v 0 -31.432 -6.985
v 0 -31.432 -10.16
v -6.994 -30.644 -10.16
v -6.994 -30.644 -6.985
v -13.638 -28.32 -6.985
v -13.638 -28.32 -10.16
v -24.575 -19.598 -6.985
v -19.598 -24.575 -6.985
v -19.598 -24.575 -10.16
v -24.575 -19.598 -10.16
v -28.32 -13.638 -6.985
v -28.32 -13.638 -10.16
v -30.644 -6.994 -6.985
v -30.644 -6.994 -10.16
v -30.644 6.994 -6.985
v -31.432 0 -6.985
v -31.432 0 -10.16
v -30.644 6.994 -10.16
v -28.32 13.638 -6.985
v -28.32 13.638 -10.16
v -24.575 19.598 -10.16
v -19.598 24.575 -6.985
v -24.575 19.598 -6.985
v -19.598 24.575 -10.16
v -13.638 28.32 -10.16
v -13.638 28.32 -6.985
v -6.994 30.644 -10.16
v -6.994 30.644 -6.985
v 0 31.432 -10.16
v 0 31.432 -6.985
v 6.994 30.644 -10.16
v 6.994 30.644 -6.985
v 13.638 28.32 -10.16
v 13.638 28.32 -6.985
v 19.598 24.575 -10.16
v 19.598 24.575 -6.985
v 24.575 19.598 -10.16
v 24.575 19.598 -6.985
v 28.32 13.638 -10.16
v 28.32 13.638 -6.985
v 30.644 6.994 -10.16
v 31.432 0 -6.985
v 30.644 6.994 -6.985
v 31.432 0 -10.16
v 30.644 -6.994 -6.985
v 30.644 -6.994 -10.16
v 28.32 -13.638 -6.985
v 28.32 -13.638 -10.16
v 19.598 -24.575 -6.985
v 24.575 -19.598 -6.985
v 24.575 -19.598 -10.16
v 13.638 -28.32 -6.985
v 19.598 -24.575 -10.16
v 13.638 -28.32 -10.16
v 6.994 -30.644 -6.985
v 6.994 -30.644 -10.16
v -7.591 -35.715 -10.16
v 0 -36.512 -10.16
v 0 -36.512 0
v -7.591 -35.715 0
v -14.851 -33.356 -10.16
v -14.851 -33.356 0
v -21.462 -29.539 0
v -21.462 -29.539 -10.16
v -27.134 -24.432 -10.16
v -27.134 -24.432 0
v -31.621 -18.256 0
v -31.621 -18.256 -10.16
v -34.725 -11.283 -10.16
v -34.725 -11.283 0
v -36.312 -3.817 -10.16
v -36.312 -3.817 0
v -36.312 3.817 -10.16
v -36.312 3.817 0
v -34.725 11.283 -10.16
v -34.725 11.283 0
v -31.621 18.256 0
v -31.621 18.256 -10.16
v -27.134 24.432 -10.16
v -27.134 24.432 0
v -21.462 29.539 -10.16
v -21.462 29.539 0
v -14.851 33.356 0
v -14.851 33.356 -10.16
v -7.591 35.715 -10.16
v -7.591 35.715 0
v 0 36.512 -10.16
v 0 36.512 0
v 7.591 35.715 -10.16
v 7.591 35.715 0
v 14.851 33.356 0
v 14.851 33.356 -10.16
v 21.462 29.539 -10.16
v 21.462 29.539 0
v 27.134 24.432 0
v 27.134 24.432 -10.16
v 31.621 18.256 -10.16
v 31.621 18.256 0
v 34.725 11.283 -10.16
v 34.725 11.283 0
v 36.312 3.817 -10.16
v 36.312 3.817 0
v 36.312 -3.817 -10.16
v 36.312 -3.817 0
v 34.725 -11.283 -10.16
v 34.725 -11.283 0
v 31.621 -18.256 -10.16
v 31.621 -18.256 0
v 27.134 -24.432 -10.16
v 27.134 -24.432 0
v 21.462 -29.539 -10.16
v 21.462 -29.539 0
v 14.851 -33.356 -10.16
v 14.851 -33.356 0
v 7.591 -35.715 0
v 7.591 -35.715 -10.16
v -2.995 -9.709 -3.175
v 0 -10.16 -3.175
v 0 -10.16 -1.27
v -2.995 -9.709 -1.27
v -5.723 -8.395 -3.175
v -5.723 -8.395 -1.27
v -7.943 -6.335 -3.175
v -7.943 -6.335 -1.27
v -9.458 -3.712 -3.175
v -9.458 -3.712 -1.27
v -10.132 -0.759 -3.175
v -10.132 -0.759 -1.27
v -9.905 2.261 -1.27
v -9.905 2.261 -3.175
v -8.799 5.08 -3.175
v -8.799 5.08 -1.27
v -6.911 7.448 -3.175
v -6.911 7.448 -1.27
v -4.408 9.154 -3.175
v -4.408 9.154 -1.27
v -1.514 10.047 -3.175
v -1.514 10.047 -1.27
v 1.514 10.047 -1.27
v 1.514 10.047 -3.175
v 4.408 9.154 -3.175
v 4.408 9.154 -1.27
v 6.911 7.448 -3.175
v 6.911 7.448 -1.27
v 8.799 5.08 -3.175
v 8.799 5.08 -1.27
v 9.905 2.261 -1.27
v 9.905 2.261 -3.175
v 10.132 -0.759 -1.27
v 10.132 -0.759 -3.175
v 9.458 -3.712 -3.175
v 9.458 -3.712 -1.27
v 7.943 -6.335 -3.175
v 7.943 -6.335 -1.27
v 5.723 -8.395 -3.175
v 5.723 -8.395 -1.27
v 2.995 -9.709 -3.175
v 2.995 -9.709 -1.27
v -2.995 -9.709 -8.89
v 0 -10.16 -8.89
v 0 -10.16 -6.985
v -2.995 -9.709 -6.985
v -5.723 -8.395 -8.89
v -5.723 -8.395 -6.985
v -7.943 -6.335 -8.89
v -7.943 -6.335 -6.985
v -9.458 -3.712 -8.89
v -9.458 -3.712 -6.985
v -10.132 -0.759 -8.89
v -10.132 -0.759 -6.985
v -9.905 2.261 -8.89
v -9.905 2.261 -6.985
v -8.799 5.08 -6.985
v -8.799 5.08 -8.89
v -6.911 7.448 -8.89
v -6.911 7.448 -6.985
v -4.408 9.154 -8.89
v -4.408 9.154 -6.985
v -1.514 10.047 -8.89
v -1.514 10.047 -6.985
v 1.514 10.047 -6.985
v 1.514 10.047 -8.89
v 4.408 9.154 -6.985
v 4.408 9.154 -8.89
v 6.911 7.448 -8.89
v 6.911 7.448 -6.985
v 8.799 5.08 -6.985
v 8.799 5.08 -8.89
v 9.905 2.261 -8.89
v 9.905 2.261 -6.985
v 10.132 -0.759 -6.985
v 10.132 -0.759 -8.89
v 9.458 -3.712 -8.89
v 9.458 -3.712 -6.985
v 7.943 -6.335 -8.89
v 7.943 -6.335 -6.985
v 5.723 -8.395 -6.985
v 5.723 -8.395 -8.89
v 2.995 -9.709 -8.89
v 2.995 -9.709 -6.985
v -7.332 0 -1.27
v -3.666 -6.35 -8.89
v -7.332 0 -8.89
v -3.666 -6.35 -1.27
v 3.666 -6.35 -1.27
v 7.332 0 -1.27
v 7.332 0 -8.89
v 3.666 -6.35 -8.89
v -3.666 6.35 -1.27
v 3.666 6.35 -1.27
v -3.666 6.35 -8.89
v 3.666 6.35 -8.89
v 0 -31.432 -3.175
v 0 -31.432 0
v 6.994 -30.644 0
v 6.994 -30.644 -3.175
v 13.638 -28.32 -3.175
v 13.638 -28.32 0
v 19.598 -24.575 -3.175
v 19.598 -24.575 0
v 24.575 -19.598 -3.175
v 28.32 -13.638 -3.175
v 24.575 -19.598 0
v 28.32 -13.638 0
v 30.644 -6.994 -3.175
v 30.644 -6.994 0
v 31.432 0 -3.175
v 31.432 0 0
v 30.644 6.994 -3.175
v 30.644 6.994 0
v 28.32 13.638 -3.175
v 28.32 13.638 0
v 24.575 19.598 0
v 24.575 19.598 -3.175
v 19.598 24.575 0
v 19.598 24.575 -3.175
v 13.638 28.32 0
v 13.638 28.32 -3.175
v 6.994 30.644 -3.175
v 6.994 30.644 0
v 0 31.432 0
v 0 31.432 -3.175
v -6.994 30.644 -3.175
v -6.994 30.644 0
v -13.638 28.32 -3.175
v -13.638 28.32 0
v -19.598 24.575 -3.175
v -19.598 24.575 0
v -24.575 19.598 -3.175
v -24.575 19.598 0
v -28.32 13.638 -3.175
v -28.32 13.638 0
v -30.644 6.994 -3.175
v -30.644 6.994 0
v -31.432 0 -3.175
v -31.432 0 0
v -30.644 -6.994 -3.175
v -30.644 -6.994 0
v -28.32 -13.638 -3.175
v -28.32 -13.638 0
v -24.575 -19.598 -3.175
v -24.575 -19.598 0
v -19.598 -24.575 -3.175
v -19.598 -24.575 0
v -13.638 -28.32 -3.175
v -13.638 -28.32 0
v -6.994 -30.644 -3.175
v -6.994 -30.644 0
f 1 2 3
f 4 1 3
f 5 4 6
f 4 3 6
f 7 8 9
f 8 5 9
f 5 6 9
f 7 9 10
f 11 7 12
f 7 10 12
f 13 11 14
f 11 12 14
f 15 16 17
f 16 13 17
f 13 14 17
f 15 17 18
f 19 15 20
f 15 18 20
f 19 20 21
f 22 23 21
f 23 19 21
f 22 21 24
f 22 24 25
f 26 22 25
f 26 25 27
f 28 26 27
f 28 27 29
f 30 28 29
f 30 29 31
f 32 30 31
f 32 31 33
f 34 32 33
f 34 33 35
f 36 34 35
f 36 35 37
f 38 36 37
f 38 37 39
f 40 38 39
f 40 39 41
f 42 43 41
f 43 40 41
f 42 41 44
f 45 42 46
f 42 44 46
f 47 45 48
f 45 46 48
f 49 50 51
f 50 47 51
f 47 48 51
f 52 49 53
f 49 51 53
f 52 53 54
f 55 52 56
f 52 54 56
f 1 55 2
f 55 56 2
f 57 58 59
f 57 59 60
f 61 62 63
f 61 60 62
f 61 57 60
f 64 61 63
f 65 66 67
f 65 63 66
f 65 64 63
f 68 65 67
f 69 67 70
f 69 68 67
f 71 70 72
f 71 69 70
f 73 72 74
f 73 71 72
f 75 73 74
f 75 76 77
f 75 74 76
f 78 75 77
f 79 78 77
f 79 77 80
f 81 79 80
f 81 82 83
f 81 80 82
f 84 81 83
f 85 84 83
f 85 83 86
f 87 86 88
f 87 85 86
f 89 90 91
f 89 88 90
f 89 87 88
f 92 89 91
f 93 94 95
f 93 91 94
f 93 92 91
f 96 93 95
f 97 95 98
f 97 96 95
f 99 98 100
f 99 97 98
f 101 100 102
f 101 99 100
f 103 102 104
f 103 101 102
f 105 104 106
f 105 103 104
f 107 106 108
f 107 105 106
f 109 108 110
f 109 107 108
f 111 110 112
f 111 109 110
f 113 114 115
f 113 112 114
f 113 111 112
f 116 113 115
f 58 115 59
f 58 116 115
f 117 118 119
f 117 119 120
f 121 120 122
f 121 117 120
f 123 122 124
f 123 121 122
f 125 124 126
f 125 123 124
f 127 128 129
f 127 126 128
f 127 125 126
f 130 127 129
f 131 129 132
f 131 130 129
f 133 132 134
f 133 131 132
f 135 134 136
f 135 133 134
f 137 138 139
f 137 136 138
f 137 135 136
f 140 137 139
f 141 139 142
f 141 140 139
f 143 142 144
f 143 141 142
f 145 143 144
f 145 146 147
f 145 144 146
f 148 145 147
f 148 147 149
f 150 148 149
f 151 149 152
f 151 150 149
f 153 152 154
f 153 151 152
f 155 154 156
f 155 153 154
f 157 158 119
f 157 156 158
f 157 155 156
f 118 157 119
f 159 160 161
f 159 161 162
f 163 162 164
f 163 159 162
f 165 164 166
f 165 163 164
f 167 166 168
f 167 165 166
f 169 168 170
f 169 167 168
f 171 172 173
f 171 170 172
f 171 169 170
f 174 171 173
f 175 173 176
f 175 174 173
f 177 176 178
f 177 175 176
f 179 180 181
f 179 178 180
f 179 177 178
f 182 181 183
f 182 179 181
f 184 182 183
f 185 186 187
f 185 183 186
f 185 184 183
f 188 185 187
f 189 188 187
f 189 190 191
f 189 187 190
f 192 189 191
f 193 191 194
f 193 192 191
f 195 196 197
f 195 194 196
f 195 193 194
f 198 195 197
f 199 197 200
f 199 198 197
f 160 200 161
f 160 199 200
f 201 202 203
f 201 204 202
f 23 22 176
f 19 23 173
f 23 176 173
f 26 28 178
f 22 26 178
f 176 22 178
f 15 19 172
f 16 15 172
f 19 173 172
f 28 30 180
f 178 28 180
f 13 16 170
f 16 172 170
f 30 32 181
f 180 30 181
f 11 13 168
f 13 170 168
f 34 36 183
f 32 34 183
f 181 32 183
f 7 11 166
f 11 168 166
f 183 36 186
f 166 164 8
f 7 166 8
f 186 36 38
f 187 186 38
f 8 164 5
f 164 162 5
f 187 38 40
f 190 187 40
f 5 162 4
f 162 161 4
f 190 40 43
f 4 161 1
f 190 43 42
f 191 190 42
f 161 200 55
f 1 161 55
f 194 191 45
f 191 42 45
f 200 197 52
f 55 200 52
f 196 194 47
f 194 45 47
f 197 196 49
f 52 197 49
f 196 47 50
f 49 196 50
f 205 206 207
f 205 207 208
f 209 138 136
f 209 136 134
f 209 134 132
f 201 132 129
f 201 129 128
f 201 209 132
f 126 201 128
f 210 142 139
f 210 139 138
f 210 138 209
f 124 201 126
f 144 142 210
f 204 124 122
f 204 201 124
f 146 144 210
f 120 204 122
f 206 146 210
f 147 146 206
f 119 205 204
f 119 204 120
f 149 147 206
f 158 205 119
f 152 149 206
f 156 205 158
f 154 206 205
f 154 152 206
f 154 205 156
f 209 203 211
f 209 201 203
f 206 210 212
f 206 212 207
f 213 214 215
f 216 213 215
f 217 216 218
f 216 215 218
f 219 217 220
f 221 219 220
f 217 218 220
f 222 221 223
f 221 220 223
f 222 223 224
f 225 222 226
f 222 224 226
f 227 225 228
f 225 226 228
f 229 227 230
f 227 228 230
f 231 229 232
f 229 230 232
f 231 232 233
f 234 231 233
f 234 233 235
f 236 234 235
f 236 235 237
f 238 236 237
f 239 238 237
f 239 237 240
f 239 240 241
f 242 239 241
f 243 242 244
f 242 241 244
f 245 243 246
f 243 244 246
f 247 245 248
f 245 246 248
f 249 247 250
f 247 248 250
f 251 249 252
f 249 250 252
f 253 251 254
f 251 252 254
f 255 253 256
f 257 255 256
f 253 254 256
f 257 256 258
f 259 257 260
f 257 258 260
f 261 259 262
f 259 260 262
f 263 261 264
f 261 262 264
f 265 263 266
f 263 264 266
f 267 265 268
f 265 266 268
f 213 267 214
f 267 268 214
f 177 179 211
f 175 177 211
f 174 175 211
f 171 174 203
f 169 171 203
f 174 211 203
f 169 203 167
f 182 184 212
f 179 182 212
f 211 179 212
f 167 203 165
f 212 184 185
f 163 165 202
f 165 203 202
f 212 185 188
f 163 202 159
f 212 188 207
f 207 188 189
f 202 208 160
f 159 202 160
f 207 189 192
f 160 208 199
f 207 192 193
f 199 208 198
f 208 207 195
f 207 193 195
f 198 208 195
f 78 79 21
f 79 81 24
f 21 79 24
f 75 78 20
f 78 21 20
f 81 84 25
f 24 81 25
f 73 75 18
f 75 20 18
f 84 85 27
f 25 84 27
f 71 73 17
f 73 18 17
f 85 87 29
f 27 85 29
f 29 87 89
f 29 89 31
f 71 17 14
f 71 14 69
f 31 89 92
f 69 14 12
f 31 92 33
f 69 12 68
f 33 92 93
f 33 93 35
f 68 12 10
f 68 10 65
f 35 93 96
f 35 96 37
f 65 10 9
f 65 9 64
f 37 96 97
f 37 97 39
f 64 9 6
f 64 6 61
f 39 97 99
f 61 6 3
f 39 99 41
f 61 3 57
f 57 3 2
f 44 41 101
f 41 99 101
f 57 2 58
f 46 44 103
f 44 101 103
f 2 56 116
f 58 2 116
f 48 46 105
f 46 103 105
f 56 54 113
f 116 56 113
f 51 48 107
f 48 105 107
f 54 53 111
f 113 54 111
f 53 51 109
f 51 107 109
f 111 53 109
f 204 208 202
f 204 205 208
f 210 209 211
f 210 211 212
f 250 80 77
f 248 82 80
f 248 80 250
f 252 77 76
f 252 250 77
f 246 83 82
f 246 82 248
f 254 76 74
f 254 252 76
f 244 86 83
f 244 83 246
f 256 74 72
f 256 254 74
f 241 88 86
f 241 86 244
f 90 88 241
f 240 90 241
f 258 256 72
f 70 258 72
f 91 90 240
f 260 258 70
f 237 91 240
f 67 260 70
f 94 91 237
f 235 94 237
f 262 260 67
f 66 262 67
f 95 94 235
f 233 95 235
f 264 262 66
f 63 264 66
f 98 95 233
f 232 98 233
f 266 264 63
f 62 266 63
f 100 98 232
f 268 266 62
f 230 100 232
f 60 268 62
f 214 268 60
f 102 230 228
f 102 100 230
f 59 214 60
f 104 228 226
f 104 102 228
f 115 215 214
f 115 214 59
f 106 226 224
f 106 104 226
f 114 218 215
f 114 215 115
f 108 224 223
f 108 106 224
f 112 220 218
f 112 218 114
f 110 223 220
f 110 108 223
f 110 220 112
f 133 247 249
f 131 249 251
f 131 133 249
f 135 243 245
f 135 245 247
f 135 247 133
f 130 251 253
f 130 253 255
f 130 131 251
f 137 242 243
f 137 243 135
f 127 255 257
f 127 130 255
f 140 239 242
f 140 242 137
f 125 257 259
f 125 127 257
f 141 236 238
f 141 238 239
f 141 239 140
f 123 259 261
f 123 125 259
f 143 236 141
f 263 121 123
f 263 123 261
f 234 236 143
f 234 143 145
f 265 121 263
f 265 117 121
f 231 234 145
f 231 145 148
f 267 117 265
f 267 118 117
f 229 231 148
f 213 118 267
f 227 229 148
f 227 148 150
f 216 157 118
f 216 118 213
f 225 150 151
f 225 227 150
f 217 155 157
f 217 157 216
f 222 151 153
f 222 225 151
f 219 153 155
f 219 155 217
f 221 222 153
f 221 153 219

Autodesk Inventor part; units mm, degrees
ref_plane "XY Plane" through (0, 0, 0) normal (0, 0, 1) x (1, 0, 0)
sketch "Sketch1" plane through (0, 0, 0) normal (1, 0, 0) x (0, 1, 0)
  line L0 (0, -8.89) -> (0, -1.27)
  line L1 (0, -1.27) -> (0, -8.89)
  line L2 (0, -1.27) -> (-10.16, -1.27)
  line L3 (-10.16, -8.89) -> (0, -8.89)
  line L4 (0, -8.89) -> (0, -1.27)
  line L5 (-31.4325, -3.175) -> (-10.16, -3.175)
  line L6 (-10.16, -6.985) -> (-31.4325, -6.985)
  line L7 (-10.16, -1.27) -> (-10.16, -3.175)
  line L8 (-10.16, -6.985) -> (-10.16, -8.89)
  line L9 (-31.4325, -3.175) -> (-31.4325, 0)
  line L10 (-31.4325, 0) -> (-36.5125, 0)
  line L11 (-36.5125, 0) -> (-36.5125, -10.16)
  line L12 (-31.4325, -6.985) -> (-31.4325, -10.16)
  line L13 (-31.4325, -10.16) -> (-36.5125, -10.16)
  dimension "d11" = 10.16
  dimension "d16" = 21.2725
  dimension "d17" = 21.2725
  dimension "d18" = 5.08
  dimension "d19" = 10.16
revolve "Revolution1" add sketch "Sketch1" angle 360 about axis through (0, 0, -8.89) along (0, 0, 1)
sketch "Sketch2" plane through (0, 0, -1.27) normal (0, 0, 1) x (1, 0, 0)
  line L0 (0, 0) -> (0, 6.35)
  line L1 (3.6662, 6.35) -> (7.3323, 0)
  line L2 (7.3323, 0) -> (3.6662, -6.35)
  line L3 (3.6662, -6.35) -> (-3.6662, -6.35)
  line L4 (-3.6662, -6.35) -> (-7.3323, 0)
  line L5 (-7.3323, 0) -> (-3.6662, 6.35)
  line L6 (-3.6662, 6.35) -> (3.6662, 6.35)
  circle A0 centre (0, 0) radius 36.5125 projected
  circle A1 centre (0, 0) radius 31.4325 projected
  dimension "d12" = 6.35
  dimension "d20" = 6.35
extrude "Extrusion1" cut sketch "Sketch2" against normal blind 25.4 contours L1 L2 L3 L4 L5 L6
ref_plane "Work Plane1" through (0, 0, 0) normal (1, 0, 0) x (0, 1, 0)
ref_plane "Work Plane2" through (0, 0, 0) normal (0, 1, 0) x (-1, 0, 0)
properties part number "BaneBots_Wheel"
